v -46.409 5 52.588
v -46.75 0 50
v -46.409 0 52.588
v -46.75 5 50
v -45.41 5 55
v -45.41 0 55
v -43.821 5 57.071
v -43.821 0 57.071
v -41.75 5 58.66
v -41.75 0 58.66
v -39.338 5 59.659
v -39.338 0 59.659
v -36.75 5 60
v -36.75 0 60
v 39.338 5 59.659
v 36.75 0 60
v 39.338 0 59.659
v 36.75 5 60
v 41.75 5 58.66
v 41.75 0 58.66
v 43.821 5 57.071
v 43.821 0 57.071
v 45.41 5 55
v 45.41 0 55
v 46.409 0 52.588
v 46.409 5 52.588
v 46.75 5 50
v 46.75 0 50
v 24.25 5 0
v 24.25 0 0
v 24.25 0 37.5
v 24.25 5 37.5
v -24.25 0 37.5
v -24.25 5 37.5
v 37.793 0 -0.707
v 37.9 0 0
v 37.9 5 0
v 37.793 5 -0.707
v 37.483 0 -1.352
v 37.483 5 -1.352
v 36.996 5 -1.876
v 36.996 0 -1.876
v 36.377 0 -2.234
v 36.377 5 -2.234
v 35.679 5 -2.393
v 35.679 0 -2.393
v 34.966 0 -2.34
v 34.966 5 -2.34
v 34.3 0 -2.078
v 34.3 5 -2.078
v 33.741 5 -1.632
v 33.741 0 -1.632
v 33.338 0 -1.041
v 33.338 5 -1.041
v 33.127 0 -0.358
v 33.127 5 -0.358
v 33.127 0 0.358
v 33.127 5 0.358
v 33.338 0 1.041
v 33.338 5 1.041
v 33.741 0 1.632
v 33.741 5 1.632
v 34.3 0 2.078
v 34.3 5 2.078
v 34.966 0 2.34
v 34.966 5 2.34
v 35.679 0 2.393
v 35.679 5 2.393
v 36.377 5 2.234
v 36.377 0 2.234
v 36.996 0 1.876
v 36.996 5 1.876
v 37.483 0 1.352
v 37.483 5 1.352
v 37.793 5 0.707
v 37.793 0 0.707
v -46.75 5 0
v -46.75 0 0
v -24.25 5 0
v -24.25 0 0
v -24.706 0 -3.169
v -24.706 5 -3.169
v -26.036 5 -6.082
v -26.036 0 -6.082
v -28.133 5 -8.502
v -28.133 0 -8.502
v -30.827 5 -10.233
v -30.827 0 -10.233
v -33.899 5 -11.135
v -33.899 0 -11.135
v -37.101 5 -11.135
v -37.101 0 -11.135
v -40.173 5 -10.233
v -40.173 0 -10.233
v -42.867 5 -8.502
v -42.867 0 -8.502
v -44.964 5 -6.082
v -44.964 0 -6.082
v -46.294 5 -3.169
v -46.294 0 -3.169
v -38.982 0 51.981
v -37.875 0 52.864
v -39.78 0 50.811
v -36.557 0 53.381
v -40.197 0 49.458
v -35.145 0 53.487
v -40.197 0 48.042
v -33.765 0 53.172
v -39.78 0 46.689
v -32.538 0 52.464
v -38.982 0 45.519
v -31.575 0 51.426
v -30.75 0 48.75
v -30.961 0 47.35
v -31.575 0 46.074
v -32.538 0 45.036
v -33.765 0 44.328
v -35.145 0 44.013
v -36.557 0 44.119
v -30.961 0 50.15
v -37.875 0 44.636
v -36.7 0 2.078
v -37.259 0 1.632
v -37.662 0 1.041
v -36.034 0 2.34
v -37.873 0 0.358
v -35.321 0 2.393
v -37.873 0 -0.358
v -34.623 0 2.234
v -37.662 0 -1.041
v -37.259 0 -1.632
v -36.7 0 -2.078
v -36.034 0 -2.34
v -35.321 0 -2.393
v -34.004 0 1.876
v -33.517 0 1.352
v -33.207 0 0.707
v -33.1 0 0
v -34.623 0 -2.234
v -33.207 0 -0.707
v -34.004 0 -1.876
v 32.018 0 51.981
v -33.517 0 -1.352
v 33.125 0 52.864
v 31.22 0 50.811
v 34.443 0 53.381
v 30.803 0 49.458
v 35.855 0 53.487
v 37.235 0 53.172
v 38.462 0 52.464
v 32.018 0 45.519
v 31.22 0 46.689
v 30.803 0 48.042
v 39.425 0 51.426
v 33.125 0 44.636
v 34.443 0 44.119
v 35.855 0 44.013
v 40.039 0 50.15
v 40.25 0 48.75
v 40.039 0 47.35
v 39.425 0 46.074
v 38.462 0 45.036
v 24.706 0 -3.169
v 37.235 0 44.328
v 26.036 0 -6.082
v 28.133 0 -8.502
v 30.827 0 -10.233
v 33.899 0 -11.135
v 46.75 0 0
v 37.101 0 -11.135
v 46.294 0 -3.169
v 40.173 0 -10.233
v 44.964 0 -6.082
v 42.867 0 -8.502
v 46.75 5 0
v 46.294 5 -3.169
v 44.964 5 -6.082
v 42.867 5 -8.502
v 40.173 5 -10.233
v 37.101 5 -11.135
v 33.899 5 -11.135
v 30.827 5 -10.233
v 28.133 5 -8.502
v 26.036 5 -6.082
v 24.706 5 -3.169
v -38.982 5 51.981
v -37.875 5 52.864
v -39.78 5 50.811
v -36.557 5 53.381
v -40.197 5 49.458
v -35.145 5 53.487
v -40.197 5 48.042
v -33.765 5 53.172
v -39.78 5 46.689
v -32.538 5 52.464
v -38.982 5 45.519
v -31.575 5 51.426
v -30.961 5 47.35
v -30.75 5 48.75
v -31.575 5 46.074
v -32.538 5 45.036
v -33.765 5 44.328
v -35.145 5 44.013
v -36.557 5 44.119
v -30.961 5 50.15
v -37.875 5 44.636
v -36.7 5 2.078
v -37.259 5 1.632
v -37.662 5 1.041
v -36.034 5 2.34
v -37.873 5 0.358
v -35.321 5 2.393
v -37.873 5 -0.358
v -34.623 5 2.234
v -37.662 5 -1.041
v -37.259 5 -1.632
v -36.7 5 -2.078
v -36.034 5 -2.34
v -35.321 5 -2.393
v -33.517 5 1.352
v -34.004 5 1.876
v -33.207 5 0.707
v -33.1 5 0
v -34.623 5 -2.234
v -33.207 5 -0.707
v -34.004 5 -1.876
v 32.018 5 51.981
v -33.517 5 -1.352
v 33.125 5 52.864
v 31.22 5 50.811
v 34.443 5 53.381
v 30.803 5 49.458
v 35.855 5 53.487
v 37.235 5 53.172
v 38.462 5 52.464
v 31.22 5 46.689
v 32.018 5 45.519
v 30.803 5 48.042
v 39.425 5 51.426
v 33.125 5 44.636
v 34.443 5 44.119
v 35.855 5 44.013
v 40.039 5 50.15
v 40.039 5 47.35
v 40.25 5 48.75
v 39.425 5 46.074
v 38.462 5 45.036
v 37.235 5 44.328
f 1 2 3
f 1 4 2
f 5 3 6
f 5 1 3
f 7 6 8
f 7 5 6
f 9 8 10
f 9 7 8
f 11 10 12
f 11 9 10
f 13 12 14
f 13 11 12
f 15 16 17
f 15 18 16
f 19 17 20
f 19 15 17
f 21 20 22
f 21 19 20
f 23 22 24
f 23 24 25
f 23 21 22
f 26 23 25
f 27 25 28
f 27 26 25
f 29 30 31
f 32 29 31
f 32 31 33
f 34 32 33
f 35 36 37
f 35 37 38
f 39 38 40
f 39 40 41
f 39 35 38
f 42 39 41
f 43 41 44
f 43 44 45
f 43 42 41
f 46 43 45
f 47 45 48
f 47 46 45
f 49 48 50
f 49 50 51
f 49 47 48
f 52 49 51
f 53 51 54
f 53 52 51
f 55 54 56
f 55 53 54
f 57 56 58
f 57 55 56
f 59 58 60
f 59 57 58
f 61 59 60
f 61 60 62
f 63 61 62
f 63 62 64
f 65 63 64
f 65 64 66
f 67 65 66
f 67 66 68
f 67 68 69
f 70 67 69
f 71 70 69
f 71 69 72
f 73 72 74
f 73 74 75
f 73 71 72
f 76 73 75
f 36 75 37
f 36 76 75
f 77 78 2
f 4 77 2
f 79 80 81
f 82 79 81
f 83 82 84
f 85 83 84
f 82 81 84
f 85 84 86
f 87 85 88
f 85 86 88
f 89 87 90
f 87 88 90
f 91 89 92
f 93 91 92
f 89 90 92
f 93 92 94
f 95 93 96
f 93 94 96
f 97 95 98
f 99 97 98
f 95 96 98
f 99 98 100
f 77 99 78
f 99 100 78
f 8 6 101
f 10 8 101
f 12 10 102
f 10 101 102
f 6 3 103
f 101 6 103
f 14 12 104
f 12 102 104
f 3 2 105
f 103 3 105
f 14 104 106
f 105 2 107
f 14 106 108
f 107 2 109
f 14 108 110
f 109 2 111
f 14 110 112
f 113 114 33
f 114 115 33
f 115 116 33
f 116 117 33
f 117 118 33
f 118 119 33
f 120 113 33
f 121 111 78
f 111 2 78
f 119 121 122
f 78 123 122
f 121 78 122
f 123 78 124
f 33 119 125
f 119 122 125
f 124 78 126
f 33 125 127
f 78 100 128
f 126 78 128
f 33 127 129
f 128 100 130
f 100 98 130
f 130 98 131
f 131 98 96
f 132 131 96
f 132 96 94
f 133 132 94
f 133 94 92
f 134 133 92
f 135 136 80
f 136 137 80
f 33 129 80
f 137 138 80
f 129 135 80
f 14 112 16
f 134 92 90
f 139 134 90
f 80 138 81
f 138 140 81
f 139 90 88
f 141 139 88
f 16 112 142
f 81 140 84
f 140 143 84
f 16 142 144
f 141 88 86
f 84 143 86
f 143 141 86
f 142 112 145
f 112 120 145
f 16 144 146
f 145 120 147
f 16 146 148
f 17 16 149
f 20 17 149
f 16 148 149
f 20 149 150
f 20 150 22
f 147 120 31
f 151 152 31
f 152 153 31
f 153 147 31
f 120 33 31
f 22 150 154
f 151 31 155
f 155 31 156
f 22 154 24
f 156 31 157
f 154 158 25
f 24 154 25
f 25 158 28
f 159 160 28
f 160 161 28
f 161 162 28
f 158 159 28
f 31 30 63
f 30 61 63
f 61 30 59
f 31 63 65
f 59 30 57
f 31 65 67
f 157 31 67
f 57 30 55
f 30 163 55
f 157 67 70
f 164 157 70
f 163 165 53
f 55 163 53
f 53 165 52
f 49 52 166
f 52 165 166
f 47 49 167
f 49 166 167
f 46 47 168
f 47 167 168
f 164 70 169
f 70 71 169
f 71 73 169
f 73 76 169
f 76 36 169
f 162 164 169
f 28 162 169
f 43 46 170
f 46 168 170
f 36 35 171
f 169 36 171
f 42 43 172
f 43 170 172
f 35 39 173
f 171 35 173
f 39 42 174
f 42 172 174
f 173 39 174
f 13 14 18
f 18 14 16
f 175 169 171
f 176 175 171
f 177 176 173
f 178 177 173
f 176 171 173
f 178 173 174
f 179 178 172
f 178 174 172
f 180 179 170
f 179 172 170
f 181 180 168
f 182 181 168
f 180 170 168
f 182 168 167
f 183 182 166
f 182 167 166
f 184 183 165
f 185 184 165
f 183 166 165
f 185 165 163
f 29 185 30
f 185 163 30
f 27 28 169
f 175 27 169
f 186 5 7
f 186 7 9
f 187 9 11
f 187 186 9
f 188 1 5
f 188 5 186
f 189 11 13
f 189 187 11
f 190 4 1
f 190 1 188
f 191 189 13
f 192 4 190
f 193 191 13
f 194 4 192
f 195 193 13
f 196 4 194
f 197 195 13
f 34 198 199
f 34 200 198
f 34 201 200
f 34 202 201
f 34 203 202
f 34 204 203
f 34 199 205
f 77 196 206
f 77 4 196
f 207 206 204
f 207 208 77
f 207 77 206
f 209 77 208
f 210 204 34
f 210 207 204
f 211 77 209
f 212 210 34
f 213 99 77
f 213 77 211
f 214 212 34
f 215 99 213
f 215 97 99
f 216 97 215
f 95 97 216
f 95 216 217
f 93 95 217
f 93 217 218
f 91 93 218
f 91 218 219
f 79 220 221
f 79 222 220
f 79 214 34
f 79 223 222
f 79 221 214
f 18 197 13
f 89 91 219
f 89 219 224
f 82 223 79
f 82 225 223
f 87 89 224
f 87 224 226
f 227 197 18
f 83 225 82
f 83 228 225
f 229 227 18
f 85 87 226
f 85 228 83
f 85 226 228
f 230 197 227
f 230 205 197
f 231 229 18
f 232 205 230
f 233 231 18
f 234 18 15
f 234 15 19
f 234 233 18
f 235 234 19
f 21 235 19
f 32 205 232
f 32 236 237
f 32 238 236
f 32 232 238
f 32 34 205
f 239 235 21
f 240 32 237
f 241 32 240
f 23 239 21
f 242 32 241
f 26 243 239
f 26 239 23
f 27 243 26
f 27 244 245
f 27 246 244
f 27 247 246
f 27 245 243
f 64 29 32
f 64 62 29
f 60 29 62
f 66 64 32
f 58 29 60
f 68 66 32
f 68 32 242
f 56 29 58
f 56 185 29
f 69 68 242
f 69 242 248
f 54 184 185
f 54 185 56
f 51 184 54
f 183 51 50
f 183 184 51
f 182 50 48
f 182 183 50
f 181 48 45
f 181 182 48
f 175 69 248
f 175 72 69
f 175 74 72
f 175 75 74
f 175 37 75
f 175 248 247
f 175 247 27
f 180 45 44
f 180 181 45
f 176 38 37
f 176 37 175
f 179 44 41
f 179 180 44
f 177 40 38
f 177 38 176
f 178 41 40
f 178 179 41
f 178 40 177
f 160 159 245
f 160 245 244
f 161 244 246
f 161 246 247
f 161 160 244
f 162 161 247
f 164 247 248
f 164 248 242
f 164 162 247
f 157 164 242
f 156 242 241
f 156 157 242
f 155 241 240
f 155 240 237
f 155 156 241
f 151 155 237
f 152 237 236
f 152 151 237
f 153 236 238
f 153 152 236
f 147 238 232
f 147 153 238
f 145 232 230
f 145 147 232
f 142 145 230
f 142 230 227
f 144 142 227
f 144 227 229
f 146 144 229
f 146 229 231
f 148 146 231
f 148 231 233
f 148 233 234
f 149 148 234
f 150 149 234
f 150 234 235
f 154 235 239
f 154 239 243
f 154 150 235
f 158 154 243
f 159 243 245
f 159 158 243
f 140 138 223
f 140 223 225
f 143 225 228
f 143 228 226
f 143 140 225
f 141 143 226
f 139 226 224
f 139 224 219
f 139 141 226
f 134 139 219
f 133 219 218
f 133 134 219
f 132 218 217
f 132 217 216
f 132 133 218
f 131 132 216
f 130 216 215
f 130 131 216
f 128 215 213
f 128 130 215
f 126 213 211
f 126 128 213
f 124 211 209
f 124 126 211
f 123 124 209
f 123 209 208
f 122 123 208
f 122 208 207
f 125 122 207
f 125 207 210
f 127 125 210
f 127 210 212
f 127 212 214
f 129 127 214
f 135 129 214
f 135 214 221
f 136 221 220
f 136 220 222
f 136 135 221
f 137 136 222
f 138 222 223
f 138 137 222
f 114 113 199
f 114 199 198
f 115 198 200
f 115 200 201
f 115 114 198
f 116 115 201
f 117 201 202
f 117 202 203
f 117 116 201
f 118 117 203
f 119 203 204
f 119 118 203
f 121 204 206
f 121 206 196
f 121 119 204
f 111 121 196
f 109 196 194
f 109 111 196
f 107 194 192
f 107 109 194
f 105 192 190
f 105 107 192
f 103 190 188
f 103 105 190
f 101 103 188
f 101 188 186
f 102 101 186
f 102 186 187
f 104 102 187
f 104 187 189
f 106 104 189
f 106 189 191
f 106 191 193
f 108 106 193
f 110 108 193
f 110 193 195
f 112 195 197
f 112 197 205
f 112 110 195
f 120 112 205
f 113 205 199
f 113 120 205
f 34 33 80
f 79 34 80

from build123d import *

# Parameters (mm, degrees)
SKETCH1_R           = 4.75
SKETCH1_R_2         = 11.25
SKETCH1_R_3         = 2.4
BOSS_EXTRUDE1_DEPTH = 5
FILLET1_R           = 10


with BuildPart() as part:
    # Sketch1 → Boss-Extrude1 (new body)
    with BuildSketch(Plane(origin=(0, 0, 0), x_dir=(1, 0, 0), z_dir=(0, 1, 0))):
        with BuildLine():
            Line((-24.25, -37.5), (-24.25, 0))
            ThreePointArc((-24.25, 0), (-35.5, -11.25), (-46.75, 0))
            Line((-46.75, 0), (-46.75, -60))
            Line((-46.75, -60), (46.75, -60))
            Line((46.75, -60), (46.75, 0))
            ThreePointArc((46.75, 0), (35.5, -11.25), (24.25, 0))
            Line((24.25, 0), (24.25, -37.5))
            Line((24.25, -37.5), (-24.25, -37.5))
        make_face()
        with Locations((-35.5, -48.75)):
            Circle(SKETCH1_R, mode=Mode.SUBTRACT)
        with Locations((35.5, -48.75)):
            Circle(SKETCH1_R, mode=Mode.SUBTRACT)
        with Locations((-35.5, 0)):
            Circle(SKETCH1_R_2)
        with Locations((-35.5, 0)):
            Circle(SKETCH1_R_3, mode=Mode.SUBTRACT)
        with Locations((35.5, 0)):
            Circle(SKETCH1_R_2)
        with Locations((35.5, 0)):
            Circle(SKETCH1_R_3, mode=Mode.SUBTRACT)
    extrude(amount=BOSS_EXTRUDE1_DEPTH)

    # Fillet1
    fillet1_edges = [part.edges().sort_by_distance(p)[0] for p in [
        (46.75, 2.5, 60),
        (-46.75, 2.5, 60),
    ]]
    fillet(fillet1_edges, radius=FILLET1_R)


solid = part.part
